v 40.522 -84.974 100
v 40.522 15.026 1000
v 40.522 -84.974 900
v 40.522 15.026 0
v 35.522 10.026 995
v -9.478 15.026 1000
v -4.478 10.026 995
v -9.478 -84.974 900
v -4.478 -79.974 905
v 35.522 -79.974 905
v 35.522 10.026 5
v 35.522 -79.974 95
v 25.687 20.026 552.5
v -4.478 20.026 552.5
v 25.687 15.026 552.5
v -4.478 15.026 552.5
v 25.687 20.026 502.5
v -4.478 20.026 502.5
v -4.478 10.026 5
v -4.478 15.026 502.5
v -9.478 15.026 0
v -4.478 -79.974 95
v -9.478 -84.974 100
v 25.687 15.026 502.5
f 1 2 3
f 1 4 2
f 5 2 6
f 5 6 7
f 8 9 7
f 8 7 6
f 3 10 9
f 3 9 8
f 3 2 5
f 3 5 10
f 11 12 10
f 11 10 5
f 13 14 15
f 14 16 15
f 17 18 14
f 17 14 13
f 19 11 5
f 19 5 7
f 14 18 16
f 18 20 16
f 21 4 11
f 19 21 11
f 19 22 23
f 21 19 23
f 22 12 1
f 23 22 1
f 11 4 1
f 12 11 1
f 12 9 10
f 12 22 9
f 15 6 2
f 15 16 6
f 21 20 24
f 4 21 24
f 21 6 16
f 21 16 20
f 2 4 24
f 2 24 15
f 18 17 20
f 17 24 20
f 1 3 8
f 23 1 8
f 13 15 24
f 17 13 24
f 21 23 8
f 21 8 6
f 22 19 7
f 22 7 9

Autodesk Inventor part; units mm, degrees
ref_plane "YZ Plane" through (0, 0, 0) normal (1, 0, 0) x (0, 1, 0)
ref_plane "XZ Plane" through (0, 0, 0) normal (0, 1, 0) x (-1, 0, 0)
ref_plane "XY Plane" through (0, 0, 0) normal (0, 0, 1) x (1, 0, 0)
sketch "Sketch2" plane through (0, 0, 0) normal (0, 0, 1) x (1, 0, 0)
  line L0 (-9.4777, 15.0257) -> (40.5223, 15.0257)
  line L1 (40.5223, 15.0257) -> (40.5223, -84.9743)
  line L2 (40.5223, -84.9743) -> (-9.4777, -84.9743)
  line L3 (-9.4777, -84.9743) -> (-9.4777, 15.0257)
  line L4 (35.5223, 10.0257) -> (-4.4777, 10.0257)
  line L5 (-4.4777, 10.0257) -> (-4.4777, -79.9743)
  line L6 (-4.4777, -79.9743) -> (35.5223, -79.9743)
  line L7 (35.5223, -79.9743) -> (35.5223, 10.0257)
  point P0 (0, 0)
  point P1 (0, 0)
  dimension "d6" = 50
  dimension "d7" = 100
  dimension "d8" = 5
  dimension "d9" = 90
  dimension "d10" = 5
  dimension "d11" = 40
extrude "Extrusion1" add sketch "Sketch2" along normal blind 1000
sketch "Sketch3" plane through (40.5223, -84.9743, 0) normal (1, 0, 0) x (0, 0, -1)
  line L0 (0, 100) -> (-100, 0)
  line L1 (0, 100) -> (141.4214, 100) construction
  line L2 (0, 0) -> (0, 100) projected
  line L3 (0, 100) -> (0, 0)
  line L4 (0, 0) -> (-100, 0)
  line L5 (0, 0) -> (-1000, 0) projected
  line L6 (0, 100) -> (-1000, 100) projected
  line L7 (-1000, 100) -> (-900, 0)
  line L8 (-1000, 100) -> (-858.5786, 100) construction
  line L9 (-1000, 100) -> (-1000, 0)
  line L10 (-1000, 0) -> (-900, 0)
  point P0 (0, 84.9743)
  dimension "d14" = 135
  dimension "d15" = 45
extrude "Extrusion2" cut sketch "Sketch3" against normal blind 1000 contours L2 L4 L0 | L7 L5 L9
sketch "Sketch5" plane through (-9.4777, 15.0257, 0) normal (0, 1, 0) x (1, 0, 0)
  line L0 (5, -552.5) -> (35.1644, -552.5)
  line L1 (35.1644, -552.5) -> (35.1644, -502.5)
  line L2 (35.1644, -502.5) -> (5, -502.5)
  line L3 (5, -502.5) -> (5, -552.5)
  line L4 (0, 0) -> (0, -1000) projected
  line L5 (50, 0) -> (0, 0) projected
  point P0 (9.4777, 0)
  dimension "d23" = 5
  dimension "d24" = 50
  dimension "d25" = 502.5
extrude "Extrusion4" add sketch "Sketch5" along normal blind 5
properties part number "PerfilH1"
